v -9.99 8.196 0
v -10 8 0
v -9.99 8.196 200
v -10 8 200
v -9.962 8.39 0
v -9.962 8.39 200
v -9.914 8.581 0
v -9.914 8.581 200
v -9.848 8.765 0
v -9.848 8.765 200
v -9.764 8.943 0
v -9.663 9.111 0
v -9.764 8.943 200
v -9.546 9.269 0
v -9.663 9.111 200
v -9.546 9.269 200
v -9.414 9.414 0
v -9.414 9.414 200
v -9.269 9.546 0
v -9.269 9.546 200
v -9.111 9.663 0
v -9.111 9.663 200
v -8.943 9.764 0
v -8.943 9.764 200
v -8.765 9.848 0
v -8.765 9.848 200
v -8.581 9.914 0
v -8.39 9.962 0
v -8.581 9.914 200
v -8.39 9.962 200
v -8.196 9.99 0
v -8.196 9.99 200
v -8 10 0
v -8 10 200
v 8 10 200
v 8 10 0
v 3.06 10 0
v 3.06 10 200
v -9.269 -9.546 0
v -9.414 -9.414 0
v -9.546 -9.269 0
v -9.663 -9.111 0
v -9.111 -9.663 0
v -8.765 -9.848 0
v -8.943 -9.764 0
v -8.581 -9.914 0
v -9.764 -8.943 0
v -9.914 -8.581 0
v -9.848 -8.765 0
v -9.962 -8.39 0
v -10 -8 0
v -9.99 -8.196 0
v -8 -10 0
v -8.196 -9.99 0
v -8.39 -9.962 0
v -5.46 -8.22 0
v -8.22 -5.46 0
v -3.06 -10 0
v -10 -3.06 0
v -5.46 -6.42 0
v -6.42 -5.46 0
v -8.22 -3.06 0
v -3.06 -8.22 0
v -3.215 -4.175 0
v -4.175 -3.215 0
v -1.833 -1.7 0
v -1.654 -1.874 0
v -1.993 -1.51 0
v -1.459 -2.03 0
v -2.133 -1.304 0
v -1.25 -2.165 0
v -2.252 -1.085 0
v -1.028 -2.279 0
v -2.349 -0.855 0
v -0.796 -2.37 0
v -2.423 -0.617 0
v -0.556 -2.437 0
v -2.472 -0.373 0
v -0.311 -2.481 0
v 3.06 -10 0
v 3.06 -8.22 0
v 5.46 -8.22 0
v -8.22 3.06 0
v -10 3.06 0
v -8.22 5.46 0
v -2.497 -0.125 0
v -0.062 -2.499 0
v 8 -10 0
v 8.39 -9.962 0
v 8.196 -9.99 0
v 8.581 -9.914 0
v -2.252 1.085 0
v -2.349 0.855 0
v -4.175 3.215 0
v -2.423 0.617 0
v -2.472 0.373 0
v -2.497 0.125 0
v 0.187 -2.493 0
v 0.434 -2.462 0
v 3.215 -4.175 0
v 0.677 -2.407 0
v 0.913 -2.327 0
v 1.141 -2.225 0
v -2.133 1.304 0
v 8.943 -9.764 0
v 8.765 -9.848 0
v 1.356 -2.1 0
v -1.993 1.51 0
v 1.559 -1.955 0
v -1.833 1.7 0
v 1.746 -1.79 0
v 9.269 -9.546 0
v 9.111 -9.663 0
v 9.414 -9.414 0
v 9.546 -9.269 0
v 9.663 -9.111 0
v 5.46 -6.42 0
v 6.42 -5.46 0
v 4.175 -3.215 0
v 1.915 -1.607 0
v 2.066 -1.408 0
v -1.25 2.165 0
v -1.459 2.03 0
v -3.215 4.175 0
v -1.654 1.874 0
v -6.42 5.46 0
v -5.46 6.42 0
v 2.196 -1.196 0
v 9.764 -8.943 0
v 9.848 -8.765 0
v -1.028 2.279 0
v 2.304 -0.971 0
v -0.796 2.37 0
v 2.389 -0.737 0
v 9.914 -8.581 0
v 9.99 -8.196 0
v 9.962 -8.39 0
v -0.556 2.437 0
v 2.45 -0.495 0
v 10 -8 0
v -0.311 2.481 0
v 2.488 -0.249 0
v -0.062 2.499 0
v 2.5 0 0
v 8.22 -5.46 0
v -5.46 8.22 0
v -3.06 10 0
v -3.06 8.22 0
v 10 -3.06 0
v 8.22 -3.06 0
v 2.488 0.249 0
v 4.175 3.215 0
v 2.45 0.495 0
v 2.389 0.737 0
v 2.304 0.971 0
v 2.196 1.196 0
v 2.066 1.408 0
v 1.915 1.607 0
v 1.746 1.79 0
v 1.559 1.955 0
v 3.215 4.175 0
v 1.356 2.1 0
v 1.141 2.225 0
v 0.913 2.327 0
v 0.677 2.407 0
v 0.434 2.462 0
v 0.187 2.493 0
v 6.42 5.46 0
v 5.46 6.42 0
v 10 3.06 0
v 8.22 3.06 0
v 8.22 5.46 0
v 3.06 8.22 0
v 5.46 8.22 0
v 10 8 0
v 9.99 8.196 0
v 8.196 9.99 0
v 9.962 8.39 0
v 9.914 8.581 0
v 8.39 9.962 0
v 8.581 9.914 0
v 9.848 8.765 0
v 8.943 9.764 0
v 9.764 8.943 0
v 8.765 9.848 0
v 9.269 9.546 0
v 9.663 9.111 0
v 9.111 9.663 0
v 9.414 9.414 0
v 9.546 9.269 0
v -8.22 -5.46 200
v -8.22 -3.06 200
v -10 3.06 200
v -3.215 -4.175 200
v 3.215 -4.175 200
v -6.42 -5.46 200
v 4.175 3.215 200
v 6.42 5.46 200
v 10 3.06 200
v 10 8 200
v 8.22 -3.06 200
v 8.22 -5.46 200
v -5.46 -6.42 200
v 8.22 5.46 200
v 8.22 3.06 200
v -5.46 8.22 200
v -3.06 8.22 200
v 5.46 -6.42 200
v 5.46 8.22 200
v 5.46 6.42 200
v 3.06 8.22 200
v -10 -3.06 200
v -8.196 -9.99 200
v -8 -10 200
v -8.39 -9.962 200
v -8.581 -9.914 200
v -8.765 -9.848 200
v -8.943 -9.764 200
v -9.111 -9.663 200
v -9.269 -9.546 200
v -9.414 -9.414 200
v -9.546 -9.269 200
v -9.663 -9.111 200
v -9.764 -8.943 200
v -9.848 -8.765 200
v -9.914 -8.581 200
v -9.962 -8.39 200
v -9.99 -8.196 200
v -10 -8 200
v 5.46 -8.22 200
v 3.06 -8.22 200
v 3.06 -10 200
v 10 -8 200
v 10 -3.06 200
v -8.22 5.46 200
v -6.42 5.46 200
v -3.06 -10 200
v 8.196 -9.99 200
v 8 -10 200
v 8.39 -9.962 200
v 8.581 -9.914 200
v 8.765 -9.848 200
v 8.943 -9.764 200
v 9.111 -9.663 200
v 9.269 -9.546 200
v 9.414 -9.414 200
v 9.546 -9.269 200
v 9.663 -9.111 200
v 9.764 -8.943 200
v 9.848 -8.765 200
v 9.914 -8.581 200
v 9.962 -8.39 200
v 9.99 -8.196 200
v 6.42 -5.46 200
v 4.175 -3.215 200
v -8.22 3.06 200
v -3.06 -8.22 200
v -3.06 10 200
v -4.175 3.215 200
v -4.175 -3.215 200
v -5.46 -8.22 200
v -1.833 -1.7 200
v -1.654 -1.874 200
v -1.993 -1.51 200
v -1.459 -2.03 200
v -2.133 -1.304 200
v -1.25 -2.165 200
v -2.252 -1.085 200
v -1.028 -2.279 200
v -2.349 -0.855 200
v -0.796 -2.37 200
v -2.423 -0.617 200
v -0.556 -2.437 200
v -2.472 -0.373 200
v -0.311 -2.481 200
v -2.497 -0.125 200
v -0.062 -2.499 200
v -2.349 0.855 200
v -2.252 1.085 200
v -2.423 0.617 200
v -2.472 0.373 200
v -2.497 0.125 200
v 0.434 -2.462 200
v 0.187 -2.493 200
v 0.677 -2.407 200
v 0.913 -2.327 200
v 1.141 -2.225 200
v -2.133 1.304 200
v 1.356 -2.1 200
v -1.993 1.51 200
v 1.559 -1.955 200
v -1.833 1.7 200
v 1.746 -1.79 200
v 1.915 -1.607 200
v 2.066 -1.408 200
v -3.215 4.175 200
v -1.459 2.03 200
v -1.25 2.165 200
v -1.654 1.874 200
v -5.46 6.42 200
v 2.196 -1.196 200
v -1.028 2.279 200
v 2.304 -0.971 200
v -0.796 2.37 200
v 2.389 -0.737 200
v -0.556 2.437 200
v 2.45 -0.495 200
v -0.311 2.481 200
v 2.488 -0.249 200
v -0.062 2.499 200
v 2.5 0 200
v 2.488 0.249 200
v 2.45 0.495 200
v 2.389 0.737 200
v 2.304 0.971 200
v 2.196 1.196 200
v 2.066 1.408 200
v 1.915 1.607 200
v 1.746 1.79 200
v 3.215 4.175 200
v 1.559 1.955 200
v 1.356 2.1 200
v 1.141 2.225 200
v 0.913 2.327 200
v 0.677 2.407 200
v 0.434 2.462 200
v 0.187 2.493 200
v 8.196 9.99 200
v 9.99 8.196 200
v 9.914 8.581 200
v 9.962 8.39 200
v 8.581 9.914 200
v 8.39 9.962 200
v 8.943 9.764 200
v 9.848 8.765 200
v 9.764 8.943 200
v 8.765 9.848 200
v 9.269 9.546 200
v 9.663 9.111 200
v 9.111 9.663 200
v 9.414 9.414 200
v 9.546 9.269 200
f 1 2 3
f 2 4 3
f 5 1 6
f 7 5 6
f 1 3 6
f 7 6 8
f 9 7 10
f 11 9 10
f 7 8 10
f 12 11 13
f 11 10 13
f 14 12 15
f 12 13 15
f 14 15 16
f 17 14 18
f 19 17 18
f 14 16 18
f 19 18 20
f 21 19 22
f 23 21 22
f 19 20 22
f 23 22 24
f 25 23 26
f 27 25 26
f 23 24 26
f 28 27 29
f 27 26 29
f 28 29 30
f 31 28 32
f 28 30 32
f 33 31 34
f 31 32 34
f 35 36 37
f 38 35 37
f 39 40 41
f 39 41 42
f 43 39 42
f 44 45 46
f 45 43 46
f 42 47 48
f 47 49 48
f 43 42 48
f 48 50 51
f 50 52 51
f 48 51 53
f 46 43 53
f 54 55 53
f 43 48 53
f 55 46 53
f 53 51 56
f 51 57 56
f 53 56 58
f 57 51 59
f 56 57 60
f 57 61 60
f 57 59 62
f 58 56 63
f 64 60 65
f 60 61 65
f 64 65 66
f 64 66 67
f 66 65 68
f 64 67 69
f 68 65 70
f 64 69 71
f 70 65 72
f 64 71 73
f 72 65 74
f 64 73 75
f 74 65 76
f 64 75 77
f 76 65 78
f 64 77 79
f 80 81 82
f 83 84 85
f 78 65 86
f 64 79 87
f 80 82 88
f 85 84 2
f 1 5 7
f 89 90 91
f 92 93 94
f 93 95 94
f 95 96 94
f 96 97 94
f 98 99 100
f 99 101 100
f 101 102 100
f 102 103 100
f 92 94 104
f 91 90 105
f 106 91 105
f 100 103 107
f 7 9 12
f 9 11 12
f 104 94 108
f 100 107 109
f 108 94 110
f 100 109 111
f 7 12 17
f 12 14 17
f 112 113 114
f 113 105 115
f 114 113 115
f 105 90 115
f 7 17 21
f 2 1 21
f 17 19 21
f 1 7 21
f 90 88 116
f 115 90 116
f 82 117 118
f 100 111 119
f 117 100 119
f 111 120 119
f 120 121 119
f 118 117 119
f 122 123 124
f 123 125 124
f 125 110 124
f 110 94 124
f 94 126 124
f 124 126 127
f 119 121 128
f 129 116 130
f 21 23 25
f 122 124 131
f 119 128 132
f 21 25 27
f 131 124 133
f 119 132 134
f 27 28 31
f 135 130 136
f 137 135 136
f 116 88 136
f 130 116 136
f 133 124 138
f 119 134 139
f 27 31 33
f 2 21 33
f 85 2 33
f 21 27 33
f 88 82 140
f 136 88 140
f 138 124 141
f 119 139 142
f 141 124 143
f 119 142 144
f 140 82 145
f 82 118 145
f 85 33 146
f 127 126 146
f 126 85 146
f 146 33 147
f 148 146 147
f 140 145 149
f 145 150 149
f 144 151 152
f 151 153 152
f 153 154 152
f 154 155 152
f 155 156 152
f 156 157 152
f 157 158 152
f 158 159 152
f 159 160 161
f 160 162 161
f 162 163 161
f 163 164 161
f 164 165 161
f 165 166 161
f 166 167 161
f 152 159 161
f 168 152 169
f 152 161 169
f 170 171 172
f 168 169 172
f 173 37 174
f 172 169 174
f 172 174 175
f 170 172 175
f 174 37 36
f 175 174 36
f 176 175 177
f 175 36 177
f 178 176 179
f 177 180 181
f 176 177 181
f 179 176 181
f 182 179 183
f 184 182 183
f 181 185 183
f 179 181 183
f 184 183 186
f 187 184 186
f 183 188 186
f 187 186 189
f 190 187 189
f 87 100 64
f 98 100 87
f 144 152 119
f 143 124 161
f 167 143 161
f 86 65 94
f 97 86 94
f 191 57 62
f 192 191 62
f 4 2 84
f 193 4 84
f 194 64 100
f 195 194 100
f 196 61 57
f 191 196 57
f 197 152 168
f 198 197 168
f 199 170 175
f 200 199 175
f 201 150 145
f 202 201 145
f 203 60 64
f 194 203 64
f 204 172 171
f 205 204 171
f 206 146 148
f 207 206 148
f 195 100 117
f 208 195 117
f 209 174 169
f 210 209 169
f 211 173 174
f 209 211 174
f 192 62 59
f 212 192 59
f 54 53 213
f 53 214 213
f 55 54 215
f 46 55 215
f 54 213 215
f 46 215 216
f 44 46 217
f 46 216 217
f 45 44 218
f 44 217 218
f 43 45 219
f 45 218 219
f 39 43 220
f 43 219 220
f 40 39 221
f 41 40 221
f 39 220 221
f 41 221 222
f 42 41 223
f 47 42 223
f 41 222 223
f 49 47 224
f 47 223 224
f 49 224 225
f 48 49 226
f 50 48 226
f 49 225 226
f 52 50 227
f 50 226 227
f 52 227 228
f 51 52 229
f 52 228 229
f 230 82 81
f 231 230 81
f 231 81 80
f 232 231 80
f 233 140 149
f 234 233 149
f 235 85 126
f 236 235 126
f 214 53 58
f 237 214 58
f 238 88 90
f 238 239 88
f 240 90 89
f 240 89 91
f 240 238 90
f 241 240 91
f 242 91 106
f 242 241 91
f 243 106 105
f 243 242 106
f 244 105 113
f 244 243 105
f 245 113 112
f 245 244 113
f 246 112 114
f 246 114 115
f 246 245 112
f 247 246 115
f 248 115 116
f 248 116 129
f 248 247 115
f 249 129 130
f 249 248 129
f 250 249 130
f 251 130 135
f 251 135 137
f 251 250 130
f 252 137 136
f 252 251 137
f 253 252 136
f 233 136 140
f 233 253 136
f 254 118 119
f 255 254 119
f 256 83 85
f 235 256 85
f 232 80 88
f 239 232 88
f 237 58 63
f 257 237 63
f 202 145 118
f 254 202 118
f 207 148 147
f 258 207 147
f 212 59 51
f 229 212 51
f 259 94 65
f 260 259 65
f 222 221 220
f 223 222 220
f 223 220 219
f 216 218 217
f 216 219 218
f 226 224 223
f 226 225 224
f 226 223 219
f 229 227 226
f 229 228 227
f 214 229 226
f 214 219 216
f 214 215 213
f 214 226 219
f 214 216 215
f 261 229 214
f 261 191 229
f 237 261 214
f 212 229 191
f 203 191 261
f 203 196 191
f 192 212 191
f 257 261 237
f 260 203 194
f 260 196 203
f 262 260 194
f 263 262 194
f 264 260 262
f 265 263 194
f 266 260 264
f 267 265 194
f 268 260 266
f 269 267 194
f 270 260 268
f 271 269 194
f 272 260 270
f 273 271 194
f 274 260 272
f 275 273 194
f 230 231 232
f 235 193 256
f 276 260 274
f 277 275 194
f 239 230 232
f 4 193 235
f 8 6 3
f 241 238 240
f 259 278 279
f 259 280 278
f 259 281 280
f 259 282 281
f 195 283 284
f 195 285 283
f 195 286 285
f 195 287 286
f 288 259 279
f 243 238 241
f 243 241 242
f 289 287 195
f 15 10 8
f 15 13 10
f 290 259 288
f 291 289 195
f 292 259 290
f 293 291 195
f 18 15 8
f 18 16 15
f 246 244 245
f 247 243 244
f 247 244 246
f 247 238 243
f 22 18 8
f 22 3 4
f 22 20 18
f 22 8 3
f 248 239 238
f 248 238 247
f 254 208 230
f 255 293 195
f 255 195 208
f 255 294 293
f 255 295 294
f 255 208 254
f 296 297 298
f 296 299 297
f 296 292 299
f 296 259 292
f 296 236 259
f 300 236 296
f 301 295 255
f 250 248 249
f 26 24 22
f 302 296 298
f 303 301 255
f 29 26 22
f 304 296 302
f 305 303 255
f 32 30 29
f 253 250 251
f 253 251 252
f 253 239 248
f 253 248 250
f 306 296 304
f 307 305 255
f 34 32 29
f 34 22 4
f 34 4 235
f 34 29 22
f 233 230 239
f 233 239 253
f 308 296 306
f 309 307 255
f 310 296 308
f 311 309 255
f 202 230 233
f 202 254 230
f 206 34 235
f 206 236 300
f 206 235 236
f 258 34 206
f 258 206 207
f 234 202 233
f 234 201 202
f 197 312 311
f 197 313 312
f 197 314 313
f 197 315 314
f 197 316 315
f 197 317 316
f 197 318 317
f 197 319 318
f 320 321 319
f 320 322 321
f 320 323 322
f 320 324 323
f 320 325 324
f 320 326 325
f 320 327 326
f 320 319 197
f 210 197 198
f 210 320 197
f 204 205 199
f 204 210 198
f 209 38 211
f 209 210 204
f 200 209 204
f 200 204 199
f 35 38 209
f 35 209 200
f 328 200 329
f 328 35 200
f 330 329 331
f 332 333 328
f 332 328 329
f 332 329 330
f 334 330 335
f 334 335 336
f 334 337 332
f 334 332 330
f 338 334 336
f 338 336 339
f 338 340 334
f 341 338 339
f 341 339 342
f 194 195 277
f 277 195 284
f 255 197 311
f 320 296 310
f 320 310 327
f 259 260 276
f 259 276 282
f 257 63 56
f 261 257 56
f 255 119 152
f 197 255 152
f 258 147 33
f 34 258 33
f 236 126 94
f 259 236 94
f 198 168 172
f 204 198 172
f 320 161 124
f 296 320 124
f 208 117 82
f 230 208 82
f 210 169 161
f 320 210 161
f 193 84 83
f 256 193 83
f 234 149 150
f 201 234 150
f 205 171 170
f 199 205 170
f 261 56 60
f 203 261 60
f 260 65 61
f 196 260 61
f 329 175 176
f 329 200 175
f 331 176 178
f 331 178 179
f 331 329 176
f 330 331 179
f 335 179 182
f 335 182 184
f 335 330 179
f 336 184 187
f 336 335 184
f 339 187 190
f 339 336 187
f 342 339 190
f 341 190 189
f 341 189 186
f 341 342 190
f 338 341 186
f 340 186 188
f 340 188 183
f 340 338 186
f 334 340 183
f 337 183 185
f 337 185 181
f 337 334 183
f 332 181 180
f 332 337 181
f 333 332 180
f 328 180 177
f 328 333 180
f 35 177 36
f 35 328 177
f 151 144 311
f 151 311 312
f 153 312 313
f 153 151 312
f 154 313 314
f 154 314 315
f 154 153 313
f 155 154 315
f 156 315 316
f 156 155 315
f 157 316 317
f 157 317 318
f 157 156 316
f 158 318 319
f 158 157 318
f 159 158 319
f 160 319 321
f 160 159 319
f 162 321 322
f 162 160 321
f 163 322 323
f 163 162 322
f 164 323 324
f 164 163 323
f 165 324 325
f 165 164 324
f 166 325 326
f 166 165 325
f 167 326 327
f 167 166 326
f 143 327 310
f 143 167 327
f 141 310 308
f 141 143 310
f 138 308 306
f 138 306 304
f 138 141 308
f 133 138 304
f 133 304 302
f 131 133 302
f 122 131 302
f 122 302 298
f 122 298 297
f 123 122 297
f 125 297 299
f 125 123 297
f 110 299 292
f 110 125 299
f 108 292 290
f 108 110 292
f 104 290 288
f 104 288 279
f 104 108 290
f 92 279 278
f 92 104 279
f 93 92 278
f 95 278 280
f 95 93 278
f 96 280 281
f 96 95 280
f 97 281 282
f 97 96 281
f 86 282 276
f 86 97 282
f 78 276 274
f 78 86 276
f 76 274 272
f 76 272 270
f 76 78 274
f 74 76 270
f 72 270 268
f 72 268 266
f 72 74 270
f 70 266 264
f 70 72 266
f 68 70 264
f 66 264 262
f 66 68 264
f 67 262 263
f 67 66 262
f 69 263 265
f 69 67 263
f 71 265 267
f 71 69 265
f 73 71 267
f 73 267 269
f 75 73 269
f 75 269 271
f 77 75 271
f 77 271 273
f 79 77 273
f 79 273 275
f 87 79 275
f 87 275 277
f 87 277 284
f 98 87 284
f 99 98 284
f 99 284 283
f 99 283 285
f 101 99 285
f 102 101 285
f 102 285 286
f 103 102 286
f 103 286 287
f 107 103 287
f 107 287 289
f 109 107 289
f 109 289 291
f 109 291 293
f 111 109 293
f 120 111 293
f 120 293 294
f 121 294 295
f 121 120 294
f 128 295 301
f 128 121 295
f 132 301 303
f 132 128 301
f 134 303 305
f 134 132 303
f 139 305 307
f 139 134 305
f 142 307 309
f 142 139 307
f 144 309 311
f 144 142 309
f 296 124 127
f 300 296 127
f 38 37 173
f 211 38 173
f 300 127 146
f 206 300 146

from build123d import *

# Parameters (mm, degrees)
SKETCH1_R           = 2.5
BOSS_EXTRUDE1_DEPTH = 200
FILLET1_R           = 2


with BuildPart() as part:
    # Sketch1 → Boss-Extrude1 (new body)
    with BuildSketch(Plane.XY):
        Polygon((-5.46, -6.42), (-3.215, -4.175), (3.215, -4.175), (5.46, -6.42), (5.46, -8.22), (3.06, -8.22), (3.06, -10), (10, -10), (10, -3.06), (8.22, -3.06), (8.22, -5.46), (6.42, -5.46), (4.175, -3.215), (4.175, 3.215), (6.42, 5.46), (8.22, 5.46), (8.22, 3.06), (10, 3.06), (10, 10), (3.06, 10), (3.06, 8.22), (5.46, 8.22), (5.46, 6.42), (3.215, 4.175), (-3.215, 4.175), (-5.46, 6.42), (-5.46, 8.22), (-3.06, 8.22), (-3.06, 10), (-10, 10), (-10, 3.06), (-8.22, 3.06), (-8.22, 5.46), (-6.42, 5.46), (-4.175, 3.215), (-4.175, -3.215), (-6.42, -5.46), (-8.22, -5.46), (-8.22, -3.06), (-10, -3.06), (-10, -10), (-3.06, -10), (-3.06, -8.22), (-5.46, -8.22), align=None)
        Circle(SKETCH1_R, mode=Mode.SUBTRACT)
    extrude(amount=BOSS_EXTRUDE1_DEPTH)

    # Fillet1
    fillet1_edges = [part.edges().sort_by_distance(p)[0] for p in [
        (10, -10, 100),
        (-10, -10, 100),
        (-10, 10, 100),
        (10, 10, 100),
    ]]
    fillet(fillet1_edges, radius=FILLET1_R)


solid = part.part
